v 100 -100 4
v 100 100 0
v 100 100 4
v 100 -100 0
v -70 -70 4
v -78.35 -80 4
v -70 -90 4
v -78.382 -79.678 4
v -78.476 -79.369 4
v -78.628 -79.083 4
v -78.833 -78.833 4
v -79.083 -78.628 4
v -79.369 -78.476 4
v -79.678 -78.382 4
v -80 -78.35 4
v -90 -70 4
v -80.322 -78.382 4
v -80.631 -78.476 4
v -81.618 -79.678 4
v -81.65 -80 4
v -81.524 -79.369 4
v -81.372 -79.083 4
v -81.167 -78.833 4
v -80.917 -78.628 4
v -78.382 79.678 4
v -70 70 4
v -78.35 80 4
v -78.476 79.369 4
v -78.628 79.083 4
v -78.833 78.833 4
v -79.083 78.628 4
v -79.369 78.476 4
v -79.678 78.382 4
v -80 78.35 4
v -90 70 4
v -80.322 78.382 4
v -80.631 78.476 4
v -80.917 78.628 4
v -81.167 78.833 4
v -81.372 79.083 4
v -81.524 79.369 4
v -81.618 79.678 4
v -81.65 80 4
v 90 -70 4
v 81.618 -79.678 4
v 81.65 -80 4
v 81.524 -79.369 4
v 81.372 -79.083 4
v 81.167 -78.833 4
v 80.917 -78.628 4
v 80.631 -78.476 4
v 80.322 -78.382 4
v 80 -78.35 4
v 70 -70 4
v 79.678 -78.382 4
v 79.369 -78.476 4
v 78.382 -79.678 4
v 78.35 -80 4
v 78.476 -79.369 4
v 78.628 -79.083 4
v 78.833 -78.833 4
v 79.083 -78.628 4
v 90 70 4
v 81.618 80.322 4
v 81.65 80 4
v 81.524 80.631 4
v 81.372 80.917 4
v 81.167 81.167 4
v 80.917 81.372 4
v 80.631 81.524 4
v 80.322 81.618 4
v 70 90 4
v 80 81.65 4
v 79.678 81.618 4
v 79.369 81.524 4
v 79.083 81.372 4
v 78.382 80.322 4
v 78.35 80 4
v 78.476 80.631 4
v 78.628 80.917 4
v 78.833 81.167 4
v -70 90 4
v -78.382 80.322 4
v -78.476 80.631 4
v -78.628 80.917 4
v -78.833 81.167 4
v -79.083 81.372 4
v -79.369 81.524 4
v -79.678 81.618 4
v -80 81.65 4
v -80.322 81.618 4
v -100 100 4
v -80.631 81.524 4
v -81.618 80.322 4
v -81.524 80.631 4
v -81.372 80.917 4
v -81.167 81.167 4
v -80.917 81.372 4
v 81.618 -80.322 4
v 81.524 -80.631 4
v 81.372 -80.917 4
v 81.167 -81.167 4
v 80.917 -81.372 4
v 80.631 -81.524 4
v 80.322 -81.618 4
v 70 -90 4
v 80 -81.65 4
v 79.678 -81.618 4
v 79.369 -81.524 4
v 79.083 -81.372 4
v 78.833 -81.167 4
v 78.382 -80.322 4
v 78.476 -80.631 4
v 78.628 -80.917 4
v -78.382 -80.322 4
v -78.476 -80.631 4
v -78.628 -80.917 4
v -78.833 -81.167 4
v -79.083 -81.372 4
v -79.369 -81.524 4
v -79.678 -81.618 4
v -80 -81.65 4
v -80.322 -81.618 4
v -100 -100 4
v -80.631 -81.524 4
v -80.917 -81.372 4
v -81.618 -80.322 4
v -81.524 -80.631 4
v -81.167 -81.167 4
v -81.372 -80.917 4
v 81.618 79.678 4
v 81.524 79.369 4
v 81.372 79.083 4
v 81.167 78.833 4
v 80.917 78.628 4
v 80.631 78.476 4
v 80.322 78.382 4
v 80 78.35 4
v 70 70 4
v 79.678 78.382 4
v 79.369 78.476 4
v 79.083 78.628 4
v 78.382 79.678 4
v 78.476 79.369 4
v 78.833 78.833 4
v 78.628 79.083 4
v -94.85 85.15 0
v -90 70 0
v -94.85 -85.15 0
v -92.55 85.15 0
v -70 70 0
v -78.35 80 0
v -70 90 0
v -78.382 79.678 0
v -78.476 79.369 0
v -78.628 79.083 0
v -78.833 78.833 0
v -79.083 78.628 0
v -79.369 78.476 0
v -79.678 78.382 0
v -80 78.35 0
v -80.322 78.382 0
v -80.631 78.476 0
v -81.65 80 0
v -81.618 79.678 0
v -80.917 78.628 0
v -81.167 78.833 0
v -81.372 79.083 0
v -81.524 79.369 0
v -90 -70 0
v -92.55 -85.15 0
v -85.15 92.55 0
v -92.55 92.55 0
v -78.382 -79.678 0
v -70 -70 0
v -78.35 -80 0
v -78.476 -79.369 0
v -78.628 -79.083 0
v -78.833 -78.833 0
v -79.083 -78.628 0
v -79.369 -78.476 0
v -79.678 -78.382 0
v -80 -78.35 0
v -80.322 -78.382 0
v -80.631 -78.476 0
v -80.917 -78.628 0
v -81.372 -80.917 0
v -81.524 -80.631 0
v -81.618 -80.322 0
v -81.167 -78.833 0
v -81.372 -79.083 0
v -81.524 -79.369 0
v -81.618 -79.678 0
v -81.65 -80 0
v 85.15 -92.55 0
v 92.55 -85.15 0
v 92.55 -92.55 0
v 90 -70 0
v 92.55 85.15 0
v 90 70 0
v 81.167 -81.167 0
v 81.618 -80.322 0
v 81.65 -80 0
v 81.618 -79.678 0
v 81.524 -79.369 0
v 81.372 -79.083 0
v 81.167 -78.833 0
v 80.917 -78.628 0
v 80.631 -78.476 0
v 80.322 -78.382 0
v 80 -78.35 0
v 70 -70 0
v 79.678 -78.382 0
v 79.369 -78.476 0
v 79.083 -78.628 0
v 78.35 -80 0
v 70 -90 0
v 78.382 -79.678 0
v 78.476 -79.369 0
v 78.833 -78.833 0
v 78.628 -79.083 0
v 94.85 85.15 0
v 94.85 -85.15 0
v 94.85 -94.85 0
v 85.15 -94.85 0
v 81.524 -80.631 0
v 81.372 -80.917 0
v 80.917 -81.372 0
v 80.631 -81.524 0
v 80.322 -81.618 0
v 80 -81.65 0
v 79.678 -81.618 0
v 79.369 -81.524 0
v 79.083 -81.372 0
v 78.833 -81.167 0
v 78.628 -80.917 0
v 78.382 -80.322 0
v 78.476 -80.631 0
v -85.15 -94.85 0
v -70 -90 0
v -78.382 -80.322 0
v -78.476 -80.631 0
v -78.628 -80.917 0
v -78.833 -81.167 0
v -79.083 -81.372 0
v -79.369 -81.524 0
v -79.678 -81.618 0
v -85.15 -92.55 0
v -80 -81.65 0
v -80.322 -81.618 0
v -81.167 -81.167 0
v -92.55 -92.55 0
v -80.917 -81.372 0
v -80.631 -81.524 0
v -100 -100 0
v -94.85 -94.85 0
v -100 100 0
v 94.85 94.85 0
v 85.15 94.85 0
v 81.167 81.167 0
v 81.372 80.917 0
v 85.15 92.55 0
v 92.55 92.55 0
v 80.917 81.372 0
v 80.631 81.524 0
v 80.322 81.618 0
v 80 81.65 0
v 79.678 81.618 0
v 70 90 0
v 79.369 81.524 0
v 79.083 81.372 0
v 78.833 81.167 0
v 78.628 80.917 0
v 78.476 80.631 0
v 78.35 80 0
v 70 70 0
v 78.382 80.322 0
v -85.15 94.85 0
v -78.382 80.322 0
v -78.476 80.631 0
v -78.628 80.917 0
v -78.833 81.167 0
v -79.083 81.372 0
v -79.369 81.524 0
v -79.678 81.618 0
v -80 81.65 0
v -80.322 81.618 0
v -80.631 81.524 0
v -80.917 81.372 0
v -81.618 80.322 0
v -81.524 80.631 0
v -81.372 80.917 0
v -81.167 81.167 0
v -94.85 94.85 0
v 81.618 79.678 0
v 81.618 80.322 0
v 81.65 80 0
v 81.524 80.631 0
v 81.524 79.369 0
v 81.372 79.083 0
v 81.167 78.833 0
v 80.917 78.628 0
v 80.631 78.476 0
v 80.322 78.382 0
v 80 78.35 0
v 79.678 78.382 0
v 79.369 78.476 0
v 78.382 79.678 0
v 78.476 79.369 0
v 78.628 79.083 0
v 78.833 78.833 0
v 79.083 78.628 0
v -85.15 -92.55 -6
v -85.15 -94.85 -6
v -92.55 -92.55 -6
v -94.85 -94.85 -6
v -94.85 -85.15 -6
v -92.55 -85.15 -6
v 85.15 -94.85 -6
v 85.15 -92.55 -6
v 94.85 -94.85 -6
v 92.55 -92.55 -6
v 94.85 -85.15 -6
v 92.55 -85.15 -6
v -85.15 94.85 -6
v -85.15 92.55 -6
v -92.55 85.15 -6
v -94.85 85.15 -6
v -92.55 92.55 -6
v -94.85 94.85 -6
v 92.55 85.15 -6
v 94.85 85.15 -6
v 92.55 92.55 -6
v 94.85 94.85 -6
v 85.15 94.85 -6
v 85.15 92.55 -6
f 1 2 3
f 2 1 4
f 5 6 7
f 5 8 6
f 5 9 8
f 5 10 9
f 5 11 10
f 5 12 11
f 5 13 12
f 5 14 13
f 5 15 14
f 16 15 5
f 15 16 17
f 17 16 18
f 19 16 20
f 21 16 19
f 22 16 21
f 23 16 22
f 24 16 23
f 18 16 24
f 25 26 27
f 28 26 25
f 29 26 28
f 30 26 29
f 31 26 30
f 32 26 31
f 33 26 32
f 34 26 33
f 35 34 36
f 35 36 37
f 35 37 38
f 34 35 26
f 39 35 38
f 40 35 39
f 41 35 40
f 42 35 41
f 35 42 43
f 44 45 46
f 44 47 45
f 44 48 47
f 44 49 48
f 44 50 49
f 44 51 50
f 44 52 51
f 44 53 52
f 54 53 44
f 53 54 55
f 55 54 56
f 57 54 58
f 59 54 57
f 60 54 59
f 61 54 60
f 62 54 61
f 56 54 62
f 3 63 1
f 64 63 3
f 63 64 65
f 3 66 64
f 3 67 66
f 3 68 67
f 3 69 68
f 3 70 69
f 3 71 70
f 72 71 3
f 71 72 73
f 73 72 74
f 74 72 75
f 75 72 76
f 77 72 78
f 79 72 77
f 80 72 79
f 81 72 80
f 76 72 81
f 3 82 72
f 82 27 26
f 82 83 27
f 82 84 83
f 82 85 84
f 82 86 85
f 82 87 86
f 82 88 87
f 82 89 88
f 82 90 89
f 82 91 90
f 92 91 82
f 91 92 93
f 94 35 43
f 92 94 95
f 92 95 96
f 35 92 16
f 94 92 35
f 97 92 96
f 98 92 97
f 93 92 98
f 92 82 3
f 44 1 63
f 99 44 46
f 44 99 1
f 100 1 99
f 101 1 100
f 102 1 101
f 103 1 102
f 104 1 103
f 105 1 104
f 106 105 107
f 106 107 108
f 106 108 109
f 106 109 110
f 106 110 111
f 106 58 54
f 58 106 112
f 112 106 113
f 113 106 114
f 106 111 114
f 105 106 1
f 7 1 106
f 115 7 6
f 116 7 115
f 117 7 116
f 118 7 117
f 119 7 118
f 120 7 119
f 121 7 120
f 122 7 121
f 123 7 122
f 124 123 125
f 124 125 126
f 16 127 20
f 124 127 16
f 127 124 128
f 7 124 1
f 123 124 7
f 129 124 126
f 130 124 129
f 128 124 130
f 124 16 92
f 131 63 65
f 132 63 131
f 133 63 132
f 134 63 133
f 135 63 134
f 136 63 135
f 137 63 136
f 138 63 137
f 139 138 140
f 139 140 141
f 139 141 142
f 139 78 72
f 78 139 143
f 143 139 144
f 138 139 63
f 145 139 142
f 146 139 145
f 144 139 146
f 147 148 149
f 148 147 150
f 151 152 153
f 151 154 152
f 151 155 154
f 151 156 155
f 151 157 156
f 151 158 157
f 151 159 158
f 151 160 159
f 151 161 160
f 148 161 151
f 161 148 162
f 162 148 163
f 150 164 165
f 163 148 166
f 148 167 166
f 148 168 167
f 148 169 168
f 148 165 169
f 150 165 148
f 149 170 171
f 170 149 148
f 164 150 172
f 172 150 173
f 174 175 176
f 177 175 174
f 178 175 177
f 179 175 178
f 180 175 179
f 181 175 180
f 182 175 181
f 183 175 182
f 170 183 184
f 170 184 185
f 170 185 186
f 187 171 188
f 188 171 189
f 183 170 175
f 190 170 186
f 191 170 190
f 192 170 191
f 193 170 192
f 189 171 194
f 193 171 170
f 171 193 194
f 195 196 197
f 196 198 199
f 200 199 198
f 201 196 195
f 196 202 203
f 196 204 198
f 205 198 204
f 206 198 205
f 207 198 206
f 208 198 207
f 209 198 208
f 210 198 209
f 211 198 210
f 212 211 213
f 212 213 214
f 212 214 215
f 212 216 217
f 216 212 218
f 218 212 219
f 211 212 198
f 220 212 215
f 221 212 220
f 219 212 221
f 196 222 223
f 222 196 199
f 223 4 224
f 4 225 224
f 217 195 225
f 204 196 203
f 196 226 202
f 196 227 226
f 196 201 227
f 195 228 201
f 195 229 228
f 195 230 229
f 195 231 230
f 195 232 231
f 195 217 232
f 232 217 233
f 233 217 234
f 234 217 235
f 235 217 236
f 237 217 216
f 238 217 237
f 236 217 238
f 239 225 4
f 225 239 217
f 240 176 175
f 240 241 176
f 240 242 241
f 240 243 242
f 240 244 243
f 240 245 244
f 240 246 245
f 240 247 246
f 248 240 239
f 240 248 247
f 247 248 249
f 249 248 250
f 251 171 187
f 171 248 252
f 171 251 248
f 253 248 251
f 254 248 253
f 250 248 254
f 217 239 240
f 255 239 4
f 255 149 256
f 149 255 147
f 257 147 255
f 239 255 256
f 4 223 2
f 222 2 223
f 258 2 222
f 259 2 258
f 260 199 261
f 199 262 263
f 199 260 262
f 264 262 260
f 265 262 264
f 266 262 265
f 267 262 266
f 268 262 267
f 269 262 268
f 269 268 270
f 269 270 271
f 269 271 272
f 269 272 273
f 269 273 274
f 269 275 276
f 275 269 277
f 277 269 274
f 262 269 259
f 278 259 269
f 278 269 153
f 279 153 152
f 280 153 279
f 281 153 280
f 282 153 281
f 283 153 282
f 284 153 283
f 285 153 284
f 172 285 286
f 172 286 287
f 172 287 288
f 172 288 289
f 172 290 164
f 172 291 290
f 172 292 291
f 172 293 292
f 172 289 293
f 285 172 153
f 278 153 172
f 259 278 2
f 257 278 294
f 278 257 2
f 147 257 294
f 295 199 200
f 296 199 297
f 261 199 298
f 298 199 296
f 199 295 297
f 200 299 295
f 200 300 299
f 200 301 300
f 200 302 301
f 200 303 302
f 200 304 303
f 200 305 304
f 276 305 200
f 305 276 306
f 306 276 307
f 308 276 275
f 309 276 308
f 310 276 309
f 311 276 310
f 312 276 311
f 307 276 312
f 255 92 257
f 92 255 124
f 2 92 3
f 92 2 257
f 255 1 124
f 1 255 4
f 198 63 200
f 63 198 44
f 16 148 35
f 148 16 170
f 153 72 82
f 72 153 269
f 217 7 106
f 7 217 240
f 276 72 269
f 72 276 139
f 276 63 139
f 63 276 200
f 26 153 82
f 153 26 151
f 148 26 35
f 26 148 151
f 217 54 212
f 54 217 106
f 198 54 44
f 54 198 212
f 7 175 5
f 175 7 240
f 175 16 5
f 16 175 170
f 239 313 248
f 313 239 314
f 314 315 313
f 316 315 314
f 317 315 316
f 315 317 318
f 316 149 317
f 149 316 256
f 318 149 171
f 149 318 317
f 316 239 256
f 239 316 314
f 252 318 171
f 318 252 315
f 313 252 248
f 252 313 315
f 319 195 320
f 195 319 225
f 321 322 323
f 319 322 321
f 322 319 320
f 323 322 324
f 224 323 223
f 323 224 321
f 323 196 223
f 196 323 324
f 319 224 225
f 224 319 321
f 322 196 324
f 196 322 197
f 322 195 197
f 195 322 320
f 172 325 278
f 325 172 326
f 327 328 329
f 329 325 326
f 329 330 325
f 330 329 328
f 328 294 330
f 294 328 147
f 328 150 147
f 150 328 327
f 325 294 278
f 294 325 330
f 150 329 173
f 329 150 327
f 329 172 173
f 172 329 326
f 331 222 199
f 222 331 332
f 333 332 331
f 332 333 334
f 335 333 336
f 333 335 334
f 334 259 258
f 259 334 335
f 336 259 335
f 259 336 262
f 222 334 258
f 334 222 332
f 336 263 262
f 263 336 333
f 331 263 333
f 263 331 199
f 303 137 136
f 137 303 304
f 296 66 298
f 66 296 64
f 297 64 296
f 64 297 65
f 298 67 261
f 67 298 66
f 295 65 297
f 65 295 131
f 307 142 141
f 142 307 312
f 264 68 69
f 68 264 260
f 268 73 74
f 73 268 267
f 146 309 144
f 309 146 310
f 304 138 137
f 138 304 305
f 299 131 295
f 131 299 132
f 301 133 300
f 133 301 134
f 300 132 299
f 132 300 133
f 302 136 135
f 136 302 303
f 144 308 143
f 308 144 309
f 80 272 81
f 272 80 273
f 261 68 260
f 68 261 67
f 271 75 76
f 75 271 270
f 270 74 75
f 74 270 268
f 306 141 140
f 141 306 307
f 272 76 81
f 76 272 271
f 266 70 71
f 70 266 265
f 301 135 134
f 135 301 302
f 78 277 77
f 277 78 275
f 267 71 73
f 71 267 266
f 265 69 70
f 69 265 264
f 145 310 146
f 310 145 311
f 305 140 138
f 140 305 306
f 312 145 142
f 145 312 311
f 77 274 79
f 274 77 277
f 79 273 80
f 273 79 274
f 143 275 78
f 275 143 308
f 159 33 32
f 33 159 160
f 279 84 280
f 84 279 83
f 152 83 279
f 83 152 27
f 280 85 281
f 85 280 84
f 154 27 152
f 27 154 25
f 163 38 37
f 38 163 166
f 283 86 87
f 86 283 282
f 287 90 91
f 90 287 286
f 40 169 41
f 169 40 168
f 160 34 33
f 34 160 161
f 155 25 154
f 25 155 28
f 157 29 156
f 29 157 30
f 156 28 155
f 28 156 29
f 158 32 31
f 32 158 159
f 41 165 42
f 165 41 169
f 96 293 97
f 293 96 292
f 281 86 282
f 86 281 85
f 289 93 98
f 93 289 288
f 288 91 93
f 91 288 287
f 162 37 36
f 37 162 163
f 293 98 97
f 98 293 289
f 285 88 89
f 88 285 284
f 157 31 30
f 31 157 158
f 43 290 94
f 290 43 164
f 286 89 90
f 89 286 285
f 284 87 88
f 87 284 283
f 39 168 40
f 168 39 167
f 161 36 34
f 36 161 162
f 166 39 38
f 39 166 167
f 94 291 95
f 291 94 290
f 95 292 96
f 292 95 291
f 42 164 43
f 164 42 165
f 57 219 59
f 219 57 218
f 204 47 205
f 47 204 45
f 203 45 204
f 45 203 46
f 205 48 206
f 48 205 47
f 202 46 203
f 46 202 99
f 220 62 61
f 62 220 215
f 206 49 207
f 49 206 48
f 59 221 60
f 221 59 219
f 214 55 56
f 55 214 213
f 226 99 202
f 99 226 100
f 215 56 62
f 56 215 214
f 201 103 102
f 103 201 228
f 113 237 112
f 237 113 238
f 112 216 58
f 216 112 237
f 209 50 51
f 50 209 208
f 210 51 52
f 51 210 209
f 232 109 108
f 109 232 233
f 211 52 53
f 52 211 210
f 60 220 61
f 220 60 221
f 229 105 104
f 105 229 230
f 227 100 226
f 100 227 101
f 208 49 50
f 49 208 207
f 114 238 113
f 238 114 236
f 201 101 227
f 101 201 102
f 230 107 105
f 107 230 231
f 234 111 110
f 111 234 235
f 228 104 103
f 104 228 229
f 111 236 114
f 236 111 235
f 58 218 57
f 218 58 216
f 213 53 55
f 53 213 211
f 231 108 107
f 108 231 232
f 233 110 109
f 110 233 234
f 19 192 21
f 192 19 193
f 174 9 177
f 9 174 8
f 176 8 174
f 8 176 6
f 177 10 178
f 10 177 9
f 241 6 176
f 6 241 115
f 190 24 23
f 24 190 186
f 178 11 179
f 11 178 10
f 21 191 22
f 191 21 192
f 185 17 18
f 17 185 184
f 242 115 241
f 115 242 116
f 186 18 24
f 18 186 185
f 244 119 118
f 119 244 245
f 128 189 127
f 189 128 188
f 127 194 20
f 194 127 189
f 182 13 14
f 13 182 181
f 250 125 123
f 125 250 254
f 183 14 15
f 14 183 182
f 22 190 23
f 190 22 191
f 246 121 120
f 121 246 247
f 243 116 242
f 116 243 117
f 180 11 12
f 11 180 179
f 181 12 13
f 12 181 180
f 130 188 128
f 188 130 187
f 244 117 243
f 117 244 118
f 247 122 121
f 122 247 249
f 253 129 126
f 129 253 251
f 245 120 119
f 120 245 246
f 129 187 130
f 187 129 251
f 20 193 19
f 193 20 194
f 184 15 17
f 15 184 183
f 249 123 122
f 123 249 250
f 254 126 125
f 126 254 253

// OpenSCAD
// file: ../screws.scad
/* Some common screw dimensions */


inf = 400; // basically infinity

/********************************************************************************/
// M3 dimensions

m3HoleRadiusSlack = 0.15;
m3Diameter = 3.0;
m3Radius = m3Diameter/2.0;

m3RadiusSlacked = m3Radius + m3HoleRadiusSlack;

// legacy TODO: replace
m3ptr = m3RadiusSlacked;

// NUTS!
m3HexNutWidthAcrossFlats = 5.41;
m3HexNutWidthAcrossCorners = FtoG(m3HexNutWidthAcrossFlats);

m3HexNutThickness = 2.18;

module m3HexNutPocketNegative() {
  hexNutPocketNegative(m3RadiusSlacked,
                       m3HexNutWidthAcrossCorners/2 + 0.1,
                       m3HexNutThickness + 0.2);
}


// TODO: remove test

*difference() {
  cube(size=[8,12,5], center=true);

  rotate(a=[0,0,20])
  m3HexNutPocketNegative();
}

*m3HexNutPocketNegative();


/********************************************************************************/
// M4 dimensions

m4HoleRadiusSlack = 0.15;
m4Diameter = 4.0;
m4Radius = m4Diameter/2.0;
m4RadiusSlacked = m4Radius + m4HoleRadiusSlack;

m4HexNutWidthAcrossFlats = 6.89;
m4HexNutWidthAcrossCorners = FtoG(m4HexNutWidthAcrossFlats);

m4HexNutThickness = 3.07;

module m4HexNutPocketNegative() {
  hexNutPocketNegative(m4RadiusSlacked,
                       m4HexNutWidthAcrossCorners/2 + 0.1,
                       m4HexNutThickness + 0.2);
}


// TODO: remove test

*difference() {
  translate(v=[0,1,0])
  cube(size=[10,12,6], center=true);

  rotate(a=[0,0,20])
  m4HexNutPocketNegative();
}

*m4HexNutPocketNegative();

/********************************************************************************/

// Convert a regular hexagon widthAcrossFlats to widthAcrossCorners
function FtoG(widthAcrossFlats) = widthAcrossFlats * (2/sqrt(3));  

// Convert a regular hexagon widthAcrossCorners to widthAcrossFlats
function GtoF(widthAcrossCorners) =  widthAcrossCorners * (sqrt(3)/2);


module hexNutPocketNegative(
  innerRadius,
  widthAcrossCorners,
  thickness)
{

  union() {

    hull() {
      // hexagonal cylinder representing where the nut should fit
      cylinder(r=widthAcrossCorners, h=thickness, center=true, $fn=6);

      // negative volume for sliding in the nut
      translate(v=[inf,0,0])
      cylinder(r=widthAcrossCorners, h=thickness, center=true, $fn=6);
    }

    // negative volume for screw lead
    translate(v=[0,0,-10])
    cylinder(r=innerRadius, h = inf, $fn=32);

    hull() {
     translate(v=[inf,0,0])
       cylinder(r=innerRadius, h = inf, $fn=32);
     cylinder(r=innerRadius, h = inf, $fn=32);
    }
  }
}
// file: ../../common.scad
/* Some initial configurations and commonly used variables
   plus functions
*/

$fn=64;


eps=0.01;

inf10 = 10;
inf50 = 50;
inf1000 = 1000;
inf = inf1000;
// main file
include <../../common.scad>
include <../screws.scad>

$fn=64;

module baseFrame() {
  difference() {
    cube(size=[200,200,4], center=true);
    cube(size=[180,180,4], center=true);
  }

  translate(v=[80,80,0])
  cube(size=[20,20, 4],center=true);

  translate(v=[-80,80,0])
  cube(size=[20,20, 4],center=true);

  translate(v=[80,-80,0])
  cube(size=[20,20, 4],center=true);

  translate(v=[-80,-80,0])
  cube(size=[20,20, 4],center=true);
}

module lugBottom() {
  difference() {
    cube(size=[9.7,9.7,6], center=true);

    translate(v=[2,2,0])
    cube(size=[9.1,9.1,5+1], center=true);
  }
  
}


module base() {

  difference() {
    union() {
      translate(v=[0,0,4/2])
        baseFrame();


      translate(v=[-90,-90,-6/2])
        lugBottom();

      mirror(v=[1,0,0])
        translate(v=[-90,-90,-6/2])
        lugBottom();

      mirror(v=[0,1,0])
        translate(v=[-90,-90,-6/2])
        lugBottom();

      mirror(v=[1,1,0])
        translate(v=[-90,-90,-6/2])
        lugBottom();
    }

    union() {
      translate(v=[80,80,0]) 
      cylinder(h = 100, r = m3ptr, $fn=32, center=true);

      translate(v=[-80,80,0]) 
      cylinder(h = 100, r = m3ptr, $fn=32, center=true);

      translate(v=[80,-80,0]) 
      cylinder(h = 100, r = m3ptr, $fn=32, center=true);

      translate(v=[-80,-80,0]) 
      cylinder(h = 100, r = m3ptr, $fn=32, center=true);
      
    }
  }
}

base();
